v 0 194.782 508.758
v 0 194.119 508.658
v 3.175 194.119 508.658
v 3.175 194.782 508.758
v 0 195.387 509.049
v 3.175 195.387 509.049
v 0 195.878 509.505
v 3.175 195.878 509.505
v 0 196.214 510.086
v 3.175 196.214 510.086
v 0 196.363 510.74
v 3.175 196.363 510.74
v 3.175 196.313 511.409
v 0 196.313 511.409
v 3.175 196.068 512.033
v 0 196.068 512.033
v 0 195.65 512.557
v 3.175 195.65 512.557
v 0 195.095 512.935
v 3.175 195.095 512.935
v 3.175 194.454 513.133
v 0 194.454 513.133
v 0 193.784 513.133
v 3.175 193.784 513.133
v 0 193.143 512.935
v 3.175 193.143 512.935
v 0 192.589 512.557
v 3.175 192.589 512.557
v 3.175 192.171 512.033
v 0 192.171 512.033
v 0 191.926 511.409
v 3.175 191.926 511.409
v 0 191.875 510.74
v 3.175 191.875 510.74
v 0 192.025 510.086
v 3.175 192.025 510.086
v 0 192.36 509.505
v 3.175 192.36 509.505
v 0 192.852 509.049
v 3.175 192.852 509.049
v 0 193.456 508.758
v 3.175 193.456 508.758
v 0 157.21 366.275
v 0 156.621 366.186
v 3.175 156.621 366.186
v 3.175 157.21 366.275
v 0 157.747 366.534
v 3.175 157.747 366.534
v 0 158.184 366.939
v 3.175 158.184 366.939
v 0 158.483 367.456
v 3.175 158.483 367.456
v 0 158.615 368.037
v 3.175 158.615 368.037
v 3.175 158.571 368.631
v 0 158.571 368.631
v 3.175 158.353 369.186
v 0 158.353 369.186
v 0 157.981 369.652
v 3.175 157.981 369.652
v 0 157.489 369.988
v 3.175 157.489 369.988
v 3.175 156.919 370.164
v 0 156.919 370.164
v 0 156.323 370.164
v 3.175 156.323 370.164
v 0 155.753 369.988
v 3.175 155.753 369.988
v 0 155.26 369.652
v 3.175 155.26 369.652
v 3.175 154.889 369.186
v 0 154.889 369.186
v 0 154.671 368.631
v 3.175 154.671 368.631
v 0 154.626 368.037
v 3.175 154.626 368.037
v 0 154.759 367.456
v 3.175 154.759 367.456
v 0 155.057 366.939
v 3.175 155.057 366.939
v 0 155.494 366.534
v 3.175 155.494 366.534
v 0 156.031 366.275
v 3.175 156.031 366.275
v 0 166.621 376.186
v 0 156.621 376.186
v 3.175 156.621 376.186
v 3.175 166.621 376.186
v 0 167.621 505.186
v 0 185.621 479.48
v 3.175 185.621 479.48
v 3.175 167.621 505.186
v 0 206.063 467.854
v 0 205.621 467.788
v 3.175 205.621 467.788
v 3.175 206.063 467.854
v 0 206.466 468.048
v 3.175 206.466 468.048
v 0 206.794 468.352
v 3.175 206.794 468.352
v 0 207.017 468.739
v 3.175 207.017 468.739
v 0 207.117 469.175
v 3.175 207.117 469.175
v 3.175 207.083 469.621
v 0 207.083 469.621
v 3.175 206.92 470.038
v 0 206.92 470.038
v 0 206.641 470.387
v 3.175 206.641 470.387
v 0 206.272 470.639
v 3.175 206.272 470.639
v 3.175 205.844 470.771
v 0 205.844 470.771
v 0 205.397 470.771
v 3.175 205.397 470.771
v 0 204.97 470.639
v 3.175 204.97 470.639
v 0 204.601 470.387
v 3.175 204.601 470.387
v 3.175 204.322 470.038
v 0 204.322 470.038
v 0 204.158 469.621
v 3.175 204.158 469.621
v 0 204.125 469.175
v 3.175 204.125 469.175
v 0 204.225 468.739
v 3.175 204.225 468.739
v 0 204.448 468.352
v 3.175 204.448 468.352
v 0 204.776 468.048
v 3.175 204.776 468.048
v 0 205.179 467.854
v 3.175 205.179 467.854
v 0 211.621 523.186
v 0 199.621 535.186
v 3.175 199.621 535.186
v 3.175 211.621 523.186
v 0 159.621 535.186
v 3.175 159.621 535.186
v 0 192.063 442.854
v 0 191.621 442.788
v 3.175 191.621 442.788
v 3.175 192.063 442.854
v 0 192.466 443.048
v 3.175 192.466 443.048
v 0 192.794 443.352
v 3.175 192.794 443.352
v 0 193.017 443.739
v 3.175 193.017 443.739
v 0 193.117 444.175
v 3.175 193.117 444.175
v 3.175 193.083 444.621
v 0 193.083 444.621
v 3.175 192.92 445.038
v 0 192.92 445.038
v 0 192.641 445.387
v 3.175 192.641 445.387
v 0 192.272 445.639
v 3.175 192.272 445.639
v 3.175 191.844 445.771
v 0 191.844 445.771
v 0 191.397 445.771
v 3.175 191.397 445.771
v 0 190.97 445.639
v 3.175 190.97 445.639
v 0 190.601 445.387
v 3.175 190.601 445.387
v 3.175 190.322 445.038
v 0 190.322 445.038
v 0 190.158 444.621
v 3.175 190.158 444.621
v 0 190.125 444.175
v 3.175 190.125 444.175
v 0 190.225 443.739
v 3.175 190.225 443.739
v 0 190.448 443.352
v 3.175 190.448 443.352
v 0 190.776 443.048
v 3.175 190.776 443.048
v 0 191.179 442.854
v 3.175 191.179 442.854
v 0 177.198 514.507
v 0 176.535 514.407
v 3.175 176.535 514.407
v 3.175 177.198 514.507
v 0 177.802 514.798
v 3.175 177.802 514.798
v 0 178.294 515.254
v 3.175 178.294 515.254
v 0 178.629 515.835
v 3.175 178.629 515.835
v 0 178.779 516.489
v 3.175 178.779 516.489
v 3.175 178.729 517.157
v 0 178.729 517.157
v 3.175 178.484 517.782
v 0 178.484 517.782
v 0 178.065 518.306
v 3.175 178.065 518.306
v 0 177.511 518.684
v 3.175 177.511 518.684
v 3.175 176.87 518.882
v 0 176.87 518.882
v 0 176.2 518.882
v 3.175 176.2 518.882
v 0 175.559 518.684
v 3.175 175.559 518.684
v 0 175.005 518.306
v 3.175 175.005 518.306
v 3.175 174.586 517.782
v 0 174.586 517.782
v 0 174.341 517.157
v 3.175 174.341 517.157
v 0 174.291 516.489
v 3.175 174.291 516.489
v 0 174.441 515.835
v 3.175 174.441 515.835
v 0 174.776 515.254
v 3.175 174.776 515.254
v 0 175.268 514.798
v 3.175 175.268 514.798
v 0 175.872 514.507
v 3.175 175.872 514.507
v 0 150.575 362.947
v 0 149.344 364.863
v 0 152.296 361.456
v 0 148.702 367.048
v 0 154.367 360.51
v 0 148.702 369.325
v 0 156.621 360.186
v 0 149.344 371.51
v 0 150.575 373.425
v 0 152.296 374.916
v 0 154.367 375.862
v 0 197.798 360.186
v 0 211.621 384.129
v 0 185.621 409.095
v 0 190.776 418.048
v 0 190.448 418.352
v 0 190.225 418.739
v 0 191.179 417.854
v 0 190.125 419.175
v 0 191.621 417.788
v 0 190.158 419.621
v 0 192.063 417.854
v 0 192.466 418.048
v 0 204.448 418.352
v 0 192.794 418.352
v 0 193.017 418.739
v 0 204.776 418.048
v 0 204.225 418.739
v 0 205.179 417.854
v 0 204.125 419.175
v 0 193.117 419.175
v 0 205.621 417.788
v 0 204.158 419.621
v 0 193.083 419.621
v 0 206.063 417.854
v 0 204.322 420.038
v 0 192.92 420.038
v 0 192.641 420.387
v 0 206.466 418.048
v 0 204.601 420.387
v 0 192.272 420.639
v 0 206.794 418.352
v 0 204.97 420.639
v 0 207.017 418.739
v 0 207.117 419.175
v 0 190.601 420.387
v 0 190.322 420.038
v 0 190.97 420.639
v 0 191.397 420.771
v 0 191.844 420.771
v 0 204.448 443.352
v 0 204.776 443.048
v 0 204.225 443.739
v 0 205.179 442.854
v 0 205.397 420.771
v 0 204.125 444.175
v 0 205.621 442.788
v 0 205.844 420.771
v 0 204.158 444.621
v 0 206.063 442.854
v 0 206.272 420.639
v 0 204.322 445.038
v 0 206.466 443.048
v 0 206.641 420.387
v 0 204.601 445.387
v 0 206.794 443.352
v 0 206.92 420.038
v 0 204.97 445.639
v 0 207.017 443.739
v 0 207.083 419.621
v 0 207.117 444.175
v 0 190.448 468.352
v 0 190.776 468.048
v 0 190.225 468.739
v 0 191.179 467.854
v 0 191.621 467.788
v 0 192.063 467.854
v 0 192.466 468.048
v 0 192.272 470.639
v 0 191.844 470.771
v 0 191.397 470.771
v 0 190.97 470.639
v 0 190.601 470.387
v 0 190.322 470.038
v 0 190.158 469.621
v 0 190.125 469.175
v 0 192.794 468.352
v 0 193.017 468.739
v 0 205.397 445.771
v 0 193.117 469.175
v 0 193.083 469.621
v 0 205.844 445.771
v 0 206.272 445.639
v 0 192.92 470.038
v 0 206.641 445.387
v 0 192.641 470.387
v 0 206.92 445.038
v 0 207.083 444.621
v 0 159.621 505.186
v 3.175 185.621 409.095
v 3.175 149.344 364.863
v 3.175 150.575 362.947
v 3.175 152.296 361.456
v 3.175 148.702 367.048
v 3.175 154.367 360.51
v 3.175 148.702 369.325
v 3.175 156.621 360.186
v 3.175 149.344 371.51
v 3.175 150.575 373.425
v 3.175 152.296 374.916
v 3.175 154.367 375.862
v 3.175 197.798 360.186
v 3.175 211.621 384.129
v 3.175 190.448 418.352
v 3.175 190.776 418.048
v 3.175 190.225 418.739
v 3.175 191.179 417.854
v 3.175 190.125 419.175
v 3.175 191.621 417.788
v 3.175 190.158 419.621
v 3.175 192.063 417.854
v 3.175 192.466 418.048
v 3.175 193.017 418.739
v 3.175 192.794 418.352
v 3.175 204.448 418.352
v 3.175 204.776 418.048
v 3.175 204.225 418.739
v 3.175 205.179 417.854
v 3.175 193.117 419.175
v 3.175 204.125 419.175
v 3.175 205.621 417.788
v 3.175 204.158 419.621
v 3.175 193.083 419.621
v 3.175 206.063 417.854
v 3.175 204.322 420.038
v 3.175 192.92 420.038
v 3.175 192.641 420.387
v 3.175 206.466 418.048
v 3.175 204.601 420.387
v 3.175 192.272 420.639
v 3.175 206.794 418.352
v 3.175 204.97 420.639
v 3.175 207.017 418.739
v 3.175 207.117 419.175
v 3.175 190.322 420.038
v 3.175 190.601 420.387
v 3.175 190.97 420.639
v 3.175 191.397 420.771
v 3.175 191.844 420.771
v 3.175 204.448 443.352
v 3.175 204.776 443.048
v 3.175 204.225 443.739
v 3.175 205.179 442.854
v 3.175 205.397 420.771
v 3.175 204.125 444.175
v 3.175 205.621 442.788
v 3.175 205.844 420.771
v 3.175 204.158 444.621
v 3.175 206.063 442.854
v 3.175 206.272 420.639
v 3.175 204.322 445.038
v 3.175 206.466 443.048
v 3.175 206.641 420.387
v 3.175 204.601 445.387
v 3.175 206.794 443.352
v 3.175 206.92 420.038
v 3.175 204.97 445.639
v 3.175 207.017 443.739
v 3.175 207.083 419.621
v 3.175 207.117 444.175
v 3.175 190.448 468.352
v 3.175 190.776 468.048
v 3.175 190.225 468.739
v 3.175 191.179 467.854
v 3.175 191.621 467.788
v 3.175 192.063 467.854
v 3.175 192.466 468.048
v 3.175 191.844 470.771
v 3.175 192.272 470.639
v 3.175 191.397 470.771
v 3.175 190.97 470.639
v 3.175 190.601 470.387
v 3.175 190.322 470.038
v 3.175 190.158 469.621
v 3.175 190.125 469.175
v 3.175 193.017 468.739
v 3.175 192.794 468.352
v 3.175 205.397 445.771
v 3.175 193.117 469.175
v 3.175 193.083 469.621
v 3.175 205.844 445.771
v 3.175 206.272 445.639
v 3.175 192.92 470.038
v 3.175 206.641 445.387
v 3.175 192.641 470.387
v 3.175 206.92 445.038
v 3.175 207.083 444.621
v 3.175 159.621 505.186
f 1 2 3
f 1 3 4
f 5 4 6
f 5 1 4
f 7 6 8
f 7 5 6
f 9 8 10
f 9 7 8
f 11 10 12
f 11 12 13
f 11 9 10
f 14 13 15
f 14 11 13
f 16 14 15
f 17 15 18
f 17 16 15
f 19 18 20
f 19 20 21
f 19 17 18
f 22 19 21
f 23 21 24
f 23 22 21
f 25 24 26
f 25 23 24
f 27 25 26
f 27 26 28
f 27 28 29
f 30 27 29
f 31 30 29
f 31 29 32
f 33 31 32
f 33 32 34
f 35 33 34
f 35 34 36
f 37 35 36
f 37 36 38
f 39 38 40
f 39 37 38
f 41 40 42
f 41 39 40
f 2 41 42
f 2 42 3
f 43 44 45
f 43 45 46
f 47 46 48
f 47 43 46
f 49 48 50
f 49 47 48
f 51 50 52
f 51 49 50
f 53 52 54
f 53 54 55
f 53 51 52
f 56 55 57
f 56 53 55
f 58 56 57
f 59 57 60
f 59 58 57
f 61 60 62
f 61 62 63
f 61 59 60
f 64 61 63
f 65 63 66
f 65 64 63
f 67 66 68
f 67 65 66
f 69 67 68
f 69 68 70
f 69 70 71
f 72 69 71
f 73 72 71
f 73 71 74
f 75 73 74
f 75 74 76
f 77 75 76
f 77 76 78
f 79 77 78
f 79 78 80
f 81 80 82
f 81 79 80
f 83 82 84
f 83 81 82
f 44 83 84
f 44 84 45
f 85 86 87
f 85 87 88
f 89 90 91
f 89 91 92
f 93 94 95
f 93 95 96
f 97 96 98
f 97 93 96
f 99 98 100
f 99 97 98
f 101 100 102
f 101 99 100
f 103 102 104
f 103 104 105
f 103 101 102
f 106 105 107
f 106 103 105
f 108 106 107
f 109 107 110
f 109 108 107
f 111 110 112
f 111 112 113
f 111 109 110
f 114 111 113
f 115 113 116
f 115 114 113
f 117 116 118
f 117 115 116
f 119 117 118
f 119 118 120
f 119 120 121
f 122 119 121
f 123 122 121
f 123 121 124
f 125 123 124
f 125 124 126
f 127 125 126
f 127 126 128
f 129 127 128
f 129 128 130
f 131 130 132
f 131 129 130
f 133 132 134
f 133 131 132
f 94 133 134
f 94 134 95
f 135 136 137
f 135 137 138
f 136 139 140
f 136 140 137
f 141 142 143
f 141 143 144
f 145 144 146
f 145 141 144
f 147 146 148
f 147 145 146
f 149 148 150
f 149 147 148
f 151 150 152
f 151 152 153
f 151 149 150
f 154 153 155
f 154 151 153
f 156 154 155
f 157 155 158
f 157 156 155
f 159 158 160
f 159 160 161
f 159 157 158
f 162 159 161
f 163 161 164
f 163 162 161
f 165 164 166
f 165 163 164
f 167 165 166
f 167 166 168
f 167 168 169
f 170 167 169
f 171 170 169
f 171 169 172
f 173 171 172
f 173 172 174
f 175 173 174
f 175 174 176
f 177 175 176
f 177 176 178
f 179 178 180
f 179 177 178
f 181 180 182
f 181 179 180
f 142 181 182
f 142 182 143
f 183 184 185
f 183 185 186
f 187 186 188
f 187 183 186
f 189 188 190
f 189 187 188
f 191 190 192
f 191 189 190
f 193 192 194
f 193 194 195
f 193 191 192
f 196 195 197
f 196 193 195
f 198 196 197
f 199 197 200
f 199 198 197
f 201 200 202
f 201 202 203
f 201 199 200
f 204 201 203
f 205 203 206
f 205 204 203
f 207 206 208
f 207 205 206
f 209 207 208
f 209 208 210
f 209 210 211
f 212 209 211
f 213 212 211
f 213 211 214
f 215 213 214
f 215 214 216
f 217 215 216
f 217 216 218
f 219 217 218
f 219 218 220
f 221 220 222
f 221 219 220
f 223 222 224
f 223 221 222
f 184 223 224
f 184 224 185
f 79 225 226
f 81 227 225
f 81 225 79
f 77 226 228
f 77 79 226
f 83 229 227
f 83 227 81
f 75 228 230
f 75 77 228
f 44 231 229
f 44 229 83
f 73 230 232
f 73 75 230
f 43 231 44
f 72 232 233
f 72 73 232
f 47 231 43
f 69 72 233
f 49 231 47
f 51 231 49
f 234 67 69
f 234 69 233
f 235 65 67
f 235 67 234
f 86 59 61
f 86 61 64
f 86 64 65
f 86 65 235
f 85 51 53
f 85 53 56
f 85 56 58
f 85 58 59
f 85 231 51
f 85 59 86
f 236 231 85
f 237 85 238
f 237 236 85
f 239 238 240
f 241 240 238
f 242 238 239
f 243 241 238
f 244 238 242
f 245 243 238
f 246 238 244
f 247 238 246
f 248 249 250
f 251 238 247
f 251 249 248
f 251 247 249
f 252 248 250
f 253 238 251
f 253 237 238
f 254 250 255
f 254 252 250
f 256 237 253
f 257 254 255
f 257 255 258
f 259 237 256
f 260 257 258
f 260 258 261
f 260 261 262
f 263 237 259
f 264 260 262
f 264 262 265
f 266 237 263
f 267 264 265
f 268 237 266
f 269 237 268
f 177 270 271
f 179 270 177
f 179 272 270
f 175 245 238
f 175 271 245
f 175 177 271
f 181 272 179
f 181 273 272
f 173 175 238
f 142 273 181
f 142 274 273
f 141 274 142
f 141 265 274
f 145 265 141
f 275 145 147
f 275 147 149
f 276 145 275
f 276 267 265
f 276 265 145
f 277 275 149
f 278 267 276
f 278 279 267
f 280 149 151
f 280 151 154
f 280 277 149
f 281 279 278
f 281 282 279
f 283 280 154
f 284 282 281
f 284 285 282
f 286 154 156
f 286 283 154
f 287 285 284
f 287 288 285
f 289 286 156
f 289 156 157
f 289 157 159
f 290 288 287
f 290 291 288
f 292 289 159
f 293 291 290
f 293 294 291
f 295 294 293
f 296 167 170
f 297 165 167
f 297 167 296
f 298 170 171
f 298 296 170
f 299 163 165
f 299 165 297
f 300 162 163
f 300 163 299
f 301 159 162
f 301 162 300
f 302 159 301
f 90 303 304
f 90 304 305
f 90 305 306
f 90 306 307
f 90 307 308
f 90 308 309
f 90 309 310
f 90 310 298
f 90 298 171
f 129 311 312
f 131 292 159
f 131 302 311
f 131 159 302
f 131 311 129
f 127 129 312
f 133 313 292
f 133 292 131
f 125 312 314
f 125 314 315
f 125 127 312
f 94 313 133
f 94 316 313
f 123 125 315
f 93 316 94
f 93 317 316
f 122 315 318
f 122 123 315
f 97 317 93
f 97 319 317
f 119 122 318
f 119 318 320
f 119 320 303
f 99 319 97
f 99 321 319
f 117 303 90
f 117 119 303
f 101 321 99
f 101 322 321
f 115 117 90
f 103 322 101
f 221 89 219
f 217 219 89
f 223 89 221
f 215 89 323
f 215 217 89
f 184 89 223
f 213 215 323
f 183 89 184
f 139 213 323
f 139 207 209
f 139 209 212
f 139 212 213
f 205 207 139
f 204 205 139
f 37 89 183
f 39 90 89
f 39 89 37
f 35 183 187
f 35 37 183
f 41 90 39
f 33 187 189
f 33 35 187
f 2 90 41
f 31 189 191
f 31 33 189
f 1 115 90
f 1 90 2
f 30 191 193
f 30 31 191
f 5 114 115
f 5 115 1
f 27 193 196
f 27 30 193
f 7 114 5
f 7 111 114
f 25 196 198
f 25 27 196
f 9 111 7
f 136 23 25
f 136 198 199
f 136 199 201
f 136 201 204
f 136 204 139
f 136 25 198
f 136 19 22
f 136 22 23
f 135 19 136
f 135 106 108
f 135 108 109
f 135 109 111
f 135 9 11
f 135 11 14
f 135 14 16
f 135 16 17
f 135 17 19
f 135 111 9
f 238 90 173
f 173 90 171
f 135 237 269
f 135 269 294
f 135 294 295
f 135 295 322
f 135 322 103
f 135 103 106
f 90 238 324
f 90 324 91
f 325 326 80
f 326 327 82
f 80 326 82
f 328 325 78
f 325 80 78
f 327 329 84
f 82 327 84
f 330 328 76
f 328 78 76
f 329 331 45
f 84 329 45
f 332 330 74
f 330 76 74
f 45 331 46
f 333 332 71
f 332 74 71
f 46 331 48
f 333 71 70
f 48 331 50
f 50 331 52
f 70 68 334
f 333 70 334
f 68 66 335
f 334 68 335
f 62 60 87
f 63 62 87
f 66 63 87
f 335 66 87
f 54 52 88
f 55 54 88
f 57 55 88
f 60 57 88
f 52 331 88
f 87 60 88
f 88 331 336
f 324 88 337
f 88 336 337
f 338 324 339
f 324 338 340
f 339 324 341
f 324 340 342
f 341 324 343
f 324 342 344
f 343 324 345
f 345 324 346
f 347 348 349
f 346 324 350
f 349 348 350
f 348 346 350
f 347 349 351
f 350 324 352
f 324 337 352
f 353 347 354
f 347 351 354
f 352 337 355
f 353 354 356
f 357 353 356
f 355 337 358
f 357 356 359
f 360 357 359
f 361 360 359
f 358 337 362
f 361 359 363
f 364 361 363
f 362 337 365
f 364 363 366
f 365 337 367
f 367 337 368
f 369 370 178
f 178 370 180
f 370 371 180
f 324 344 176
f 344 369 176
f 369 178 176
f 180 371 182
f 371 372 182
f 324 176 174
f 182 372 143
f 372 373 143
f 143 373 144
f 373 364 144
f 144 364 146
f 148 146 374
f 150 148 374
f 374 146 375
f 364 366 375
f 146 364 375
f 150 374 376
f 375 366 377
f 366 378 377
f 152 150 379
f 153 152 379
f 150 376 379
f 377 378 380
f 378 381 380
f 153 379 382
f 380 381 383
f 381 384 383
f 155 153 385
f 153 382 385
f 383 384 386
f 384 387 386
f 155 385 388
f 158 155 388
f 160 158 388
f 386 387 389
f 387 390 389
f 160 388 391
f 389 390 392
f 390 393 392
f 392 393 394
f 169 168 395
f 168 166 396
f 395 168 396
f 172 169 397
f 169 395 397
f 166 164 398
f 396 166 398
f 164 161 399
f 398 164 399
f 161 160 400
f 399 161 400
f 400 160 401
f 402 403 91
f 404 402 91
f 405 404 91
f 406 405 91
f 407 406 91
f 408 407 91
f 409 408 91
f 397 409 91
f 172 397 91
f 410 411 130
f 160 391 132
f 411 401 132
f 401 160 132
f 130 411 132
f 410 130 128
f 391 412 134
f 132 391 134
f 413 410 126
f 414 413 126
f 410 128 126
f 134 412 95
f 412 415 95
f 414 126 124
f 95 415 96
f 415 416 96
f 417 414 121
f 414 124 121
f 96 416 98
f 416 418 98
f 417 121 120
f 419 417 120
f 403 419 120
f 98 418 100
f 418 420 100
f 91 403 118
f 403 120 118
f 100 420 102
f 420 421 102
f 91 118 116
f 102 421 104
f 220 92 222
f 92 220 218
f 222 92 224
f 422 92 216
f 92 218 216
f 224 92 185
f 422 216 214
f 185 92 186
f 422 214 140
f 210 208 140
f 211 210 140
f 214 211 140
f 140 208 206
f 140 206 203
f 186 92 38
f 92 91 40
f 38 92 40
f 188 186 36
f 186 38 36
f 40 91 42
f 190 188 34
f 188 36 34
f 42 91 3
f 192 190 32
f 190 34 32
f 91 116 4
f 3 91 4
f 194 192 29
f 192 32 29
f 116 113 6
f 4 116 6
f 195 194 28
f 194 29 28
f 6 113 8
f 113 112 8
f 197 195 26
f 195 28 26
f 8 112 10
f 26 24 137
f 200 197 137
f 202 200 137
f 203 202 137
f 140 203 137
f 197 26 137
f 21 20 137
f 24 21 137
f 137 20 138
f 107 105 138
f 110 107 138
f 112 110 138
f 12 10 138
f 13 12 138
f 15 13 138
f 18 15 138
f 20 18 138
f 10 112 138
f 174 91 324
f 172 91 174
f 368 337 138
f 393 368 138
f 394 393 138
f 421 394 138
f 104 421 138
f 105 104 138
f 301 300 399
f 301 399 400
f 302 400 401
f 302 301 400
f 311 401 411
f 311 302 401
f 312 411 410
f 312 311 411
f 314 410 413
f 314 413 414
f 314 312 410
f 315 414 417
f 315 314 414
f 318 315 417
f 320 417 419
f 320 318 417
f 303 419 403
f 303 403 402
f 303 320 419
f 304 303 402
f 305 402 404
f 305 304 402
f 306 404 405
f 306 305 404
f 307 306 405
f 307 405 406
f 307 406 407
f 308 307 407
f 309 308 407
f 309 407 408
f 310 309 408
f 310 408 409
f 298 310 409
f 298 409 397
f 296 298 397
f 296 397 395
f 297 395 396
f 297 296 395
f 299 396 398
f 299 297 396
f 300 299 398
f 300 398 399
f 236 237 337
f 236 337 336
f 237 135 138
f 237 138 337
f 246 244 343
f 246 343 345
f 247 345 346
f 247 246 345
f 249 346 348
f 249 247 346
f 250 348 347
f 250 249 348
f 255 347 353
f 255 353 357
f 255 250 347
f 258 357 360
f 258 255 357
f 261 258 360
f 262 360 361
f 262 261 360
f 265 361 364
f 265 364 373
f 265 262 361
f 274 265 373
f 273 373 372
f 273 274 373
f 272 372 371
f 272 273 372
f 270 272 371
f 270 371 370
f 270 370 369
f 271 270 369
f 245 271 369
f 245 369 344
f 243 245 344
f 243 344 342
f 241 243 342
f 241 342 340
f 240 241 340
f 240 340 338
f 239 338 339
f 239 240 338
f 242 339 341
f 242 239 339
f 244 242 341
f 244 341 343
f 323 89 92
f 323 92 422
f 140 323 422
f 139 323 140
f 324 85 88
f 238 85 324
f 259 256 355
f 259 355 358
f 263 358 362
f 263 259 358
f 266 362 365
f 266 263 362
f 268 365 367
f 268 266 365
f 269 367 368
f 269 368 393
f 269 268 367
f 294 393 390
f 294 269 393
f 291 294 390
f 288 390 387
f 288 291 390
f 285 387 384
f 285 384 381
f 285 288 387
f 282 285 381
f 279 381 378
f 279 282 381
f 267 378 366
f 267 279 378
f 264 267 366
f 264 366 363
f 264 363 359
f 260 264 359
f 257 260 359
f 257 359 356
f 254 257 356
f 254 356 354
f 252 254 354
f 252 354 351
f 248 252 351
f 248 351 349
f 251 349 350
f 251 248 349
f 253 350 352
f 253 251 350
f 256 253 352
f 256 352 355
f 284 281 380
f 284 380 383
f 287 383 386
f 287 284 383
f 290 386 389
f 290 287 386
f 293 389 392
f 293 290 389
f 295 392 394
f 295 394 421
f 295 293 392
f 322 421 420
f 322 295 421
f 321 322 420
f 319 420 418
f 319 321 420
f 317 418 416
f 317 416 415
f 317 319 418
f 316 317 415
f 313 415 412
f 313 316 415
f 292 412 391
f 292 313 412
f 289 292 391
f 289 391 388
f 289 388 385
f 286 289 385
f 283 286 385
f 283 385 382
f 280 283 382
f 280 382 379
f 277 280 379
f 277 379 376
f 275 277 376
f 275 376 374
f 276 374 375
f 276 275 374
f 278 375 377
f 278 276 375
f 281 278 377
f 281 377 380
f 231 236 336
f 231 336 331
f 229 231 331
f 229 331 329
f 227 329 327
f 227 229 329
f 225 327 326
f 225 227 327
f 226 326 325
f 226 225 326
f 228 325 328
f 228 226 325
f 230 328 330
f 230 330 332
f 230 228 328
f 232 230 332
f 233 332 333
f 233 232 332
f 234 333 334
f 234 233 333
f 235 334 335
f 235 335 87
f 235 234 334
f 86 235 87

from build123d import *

# Parameters (mm, degrees)
SKETCH1_R           = 2
SKETCH1_R_2         = 1.5
SKETCH1_R_3         = 2.25
BOSS_EXTRUDE1_DEPTH = 3.175


with BuildPart() as part:
    # Sketch1 → Boss-Extrude1 (new body)
    with BuildSketch(Plane(origin=(0, 0, 0), x_dir=(0, 0, -1), z_dir=(1, 0, 0))):
        with BuildLine():
            Line((-384.128639271, 211.620810697), (-360.186352931, 197.797725233))
            Line((-360.186352931, 197.797725233), (-360.186352931, 156.620810697))
            ThreePointArc((-360.186352931, 156.620810697), (-368.186352931, 148.620810697), (-376.186352931, 156.620810697))
            Line((-376.186352931, 156.620810697), (-376.186352931, 166.620810697))
            Line((-376.186352931, 166.620810697), (-409.095318274, 185.620810697))
            Line((-409.095318274, 185.620810697), (-479.479688809, 185.620810697))
            Line((-479.479688809, 185.620810697), (-505.186352931, 167.620810697))
            Line((-505.186352931, 167.620810697), (-505.186352931, 159.620810697))
            Line((-505.186352931, 159.620810697), (-535.186352931, 159.620810697))
            Line((-535.186352931, 159.620810697), (-535.186352931, 199.620810697))
            Line((-535.186352931, 199.620810697), (-523.186352931, 211.620810697))
            Line((-523.186352931, 211.620810697), (-384.128639271, 211.620810697))
        make_face()
        with Locations((-368.186352931, 156.620810697)):
            Circle(SKETCH1_R, mode=Mode.SUBTRACT)
        with Locations((-419.287503542, 205.620810697)):
            Circle(SKETCH1_R_2, mode=Mode.SUBTRACT)
        with Locations((-510.908050144, 194.119148631)):
            Circle(SKETCH1_R_3, mode=Mode.SUBTRACT)
        with Locations((-516.656718986, 176.534985115)):
            Circle(SKETCH1_R_3, mode=Mode.SUBTRACT)
        with Locations((-419.287503542, 191.620810697)):
            Circle(SKETCH1_R_2, mode=Mode.SUBTRACT)
        with Locations((-469.287503542, 205.620810697)):
            Circle(SKETCH1_R_2, mode=Mode.SUBTRACT)
        with Locations((-469.287503542, 191.620810697)):
            Circle(SKETCH1_R_2, mode=Mode.SUBTRACT)
        with Locations((-444.287503542, 205.620810697)):
            Circle(SKETCH1_R_2, mode=Mode.SUBTRACT)
        with Locations((-444.287503542, 191.620810697)):
            Circle(SKETCH1_R_2, mode=Mode.SUBTRACT)
    extrude(amount=BOSS_EXTRUDE1_DEPTH)


solid = part.part
